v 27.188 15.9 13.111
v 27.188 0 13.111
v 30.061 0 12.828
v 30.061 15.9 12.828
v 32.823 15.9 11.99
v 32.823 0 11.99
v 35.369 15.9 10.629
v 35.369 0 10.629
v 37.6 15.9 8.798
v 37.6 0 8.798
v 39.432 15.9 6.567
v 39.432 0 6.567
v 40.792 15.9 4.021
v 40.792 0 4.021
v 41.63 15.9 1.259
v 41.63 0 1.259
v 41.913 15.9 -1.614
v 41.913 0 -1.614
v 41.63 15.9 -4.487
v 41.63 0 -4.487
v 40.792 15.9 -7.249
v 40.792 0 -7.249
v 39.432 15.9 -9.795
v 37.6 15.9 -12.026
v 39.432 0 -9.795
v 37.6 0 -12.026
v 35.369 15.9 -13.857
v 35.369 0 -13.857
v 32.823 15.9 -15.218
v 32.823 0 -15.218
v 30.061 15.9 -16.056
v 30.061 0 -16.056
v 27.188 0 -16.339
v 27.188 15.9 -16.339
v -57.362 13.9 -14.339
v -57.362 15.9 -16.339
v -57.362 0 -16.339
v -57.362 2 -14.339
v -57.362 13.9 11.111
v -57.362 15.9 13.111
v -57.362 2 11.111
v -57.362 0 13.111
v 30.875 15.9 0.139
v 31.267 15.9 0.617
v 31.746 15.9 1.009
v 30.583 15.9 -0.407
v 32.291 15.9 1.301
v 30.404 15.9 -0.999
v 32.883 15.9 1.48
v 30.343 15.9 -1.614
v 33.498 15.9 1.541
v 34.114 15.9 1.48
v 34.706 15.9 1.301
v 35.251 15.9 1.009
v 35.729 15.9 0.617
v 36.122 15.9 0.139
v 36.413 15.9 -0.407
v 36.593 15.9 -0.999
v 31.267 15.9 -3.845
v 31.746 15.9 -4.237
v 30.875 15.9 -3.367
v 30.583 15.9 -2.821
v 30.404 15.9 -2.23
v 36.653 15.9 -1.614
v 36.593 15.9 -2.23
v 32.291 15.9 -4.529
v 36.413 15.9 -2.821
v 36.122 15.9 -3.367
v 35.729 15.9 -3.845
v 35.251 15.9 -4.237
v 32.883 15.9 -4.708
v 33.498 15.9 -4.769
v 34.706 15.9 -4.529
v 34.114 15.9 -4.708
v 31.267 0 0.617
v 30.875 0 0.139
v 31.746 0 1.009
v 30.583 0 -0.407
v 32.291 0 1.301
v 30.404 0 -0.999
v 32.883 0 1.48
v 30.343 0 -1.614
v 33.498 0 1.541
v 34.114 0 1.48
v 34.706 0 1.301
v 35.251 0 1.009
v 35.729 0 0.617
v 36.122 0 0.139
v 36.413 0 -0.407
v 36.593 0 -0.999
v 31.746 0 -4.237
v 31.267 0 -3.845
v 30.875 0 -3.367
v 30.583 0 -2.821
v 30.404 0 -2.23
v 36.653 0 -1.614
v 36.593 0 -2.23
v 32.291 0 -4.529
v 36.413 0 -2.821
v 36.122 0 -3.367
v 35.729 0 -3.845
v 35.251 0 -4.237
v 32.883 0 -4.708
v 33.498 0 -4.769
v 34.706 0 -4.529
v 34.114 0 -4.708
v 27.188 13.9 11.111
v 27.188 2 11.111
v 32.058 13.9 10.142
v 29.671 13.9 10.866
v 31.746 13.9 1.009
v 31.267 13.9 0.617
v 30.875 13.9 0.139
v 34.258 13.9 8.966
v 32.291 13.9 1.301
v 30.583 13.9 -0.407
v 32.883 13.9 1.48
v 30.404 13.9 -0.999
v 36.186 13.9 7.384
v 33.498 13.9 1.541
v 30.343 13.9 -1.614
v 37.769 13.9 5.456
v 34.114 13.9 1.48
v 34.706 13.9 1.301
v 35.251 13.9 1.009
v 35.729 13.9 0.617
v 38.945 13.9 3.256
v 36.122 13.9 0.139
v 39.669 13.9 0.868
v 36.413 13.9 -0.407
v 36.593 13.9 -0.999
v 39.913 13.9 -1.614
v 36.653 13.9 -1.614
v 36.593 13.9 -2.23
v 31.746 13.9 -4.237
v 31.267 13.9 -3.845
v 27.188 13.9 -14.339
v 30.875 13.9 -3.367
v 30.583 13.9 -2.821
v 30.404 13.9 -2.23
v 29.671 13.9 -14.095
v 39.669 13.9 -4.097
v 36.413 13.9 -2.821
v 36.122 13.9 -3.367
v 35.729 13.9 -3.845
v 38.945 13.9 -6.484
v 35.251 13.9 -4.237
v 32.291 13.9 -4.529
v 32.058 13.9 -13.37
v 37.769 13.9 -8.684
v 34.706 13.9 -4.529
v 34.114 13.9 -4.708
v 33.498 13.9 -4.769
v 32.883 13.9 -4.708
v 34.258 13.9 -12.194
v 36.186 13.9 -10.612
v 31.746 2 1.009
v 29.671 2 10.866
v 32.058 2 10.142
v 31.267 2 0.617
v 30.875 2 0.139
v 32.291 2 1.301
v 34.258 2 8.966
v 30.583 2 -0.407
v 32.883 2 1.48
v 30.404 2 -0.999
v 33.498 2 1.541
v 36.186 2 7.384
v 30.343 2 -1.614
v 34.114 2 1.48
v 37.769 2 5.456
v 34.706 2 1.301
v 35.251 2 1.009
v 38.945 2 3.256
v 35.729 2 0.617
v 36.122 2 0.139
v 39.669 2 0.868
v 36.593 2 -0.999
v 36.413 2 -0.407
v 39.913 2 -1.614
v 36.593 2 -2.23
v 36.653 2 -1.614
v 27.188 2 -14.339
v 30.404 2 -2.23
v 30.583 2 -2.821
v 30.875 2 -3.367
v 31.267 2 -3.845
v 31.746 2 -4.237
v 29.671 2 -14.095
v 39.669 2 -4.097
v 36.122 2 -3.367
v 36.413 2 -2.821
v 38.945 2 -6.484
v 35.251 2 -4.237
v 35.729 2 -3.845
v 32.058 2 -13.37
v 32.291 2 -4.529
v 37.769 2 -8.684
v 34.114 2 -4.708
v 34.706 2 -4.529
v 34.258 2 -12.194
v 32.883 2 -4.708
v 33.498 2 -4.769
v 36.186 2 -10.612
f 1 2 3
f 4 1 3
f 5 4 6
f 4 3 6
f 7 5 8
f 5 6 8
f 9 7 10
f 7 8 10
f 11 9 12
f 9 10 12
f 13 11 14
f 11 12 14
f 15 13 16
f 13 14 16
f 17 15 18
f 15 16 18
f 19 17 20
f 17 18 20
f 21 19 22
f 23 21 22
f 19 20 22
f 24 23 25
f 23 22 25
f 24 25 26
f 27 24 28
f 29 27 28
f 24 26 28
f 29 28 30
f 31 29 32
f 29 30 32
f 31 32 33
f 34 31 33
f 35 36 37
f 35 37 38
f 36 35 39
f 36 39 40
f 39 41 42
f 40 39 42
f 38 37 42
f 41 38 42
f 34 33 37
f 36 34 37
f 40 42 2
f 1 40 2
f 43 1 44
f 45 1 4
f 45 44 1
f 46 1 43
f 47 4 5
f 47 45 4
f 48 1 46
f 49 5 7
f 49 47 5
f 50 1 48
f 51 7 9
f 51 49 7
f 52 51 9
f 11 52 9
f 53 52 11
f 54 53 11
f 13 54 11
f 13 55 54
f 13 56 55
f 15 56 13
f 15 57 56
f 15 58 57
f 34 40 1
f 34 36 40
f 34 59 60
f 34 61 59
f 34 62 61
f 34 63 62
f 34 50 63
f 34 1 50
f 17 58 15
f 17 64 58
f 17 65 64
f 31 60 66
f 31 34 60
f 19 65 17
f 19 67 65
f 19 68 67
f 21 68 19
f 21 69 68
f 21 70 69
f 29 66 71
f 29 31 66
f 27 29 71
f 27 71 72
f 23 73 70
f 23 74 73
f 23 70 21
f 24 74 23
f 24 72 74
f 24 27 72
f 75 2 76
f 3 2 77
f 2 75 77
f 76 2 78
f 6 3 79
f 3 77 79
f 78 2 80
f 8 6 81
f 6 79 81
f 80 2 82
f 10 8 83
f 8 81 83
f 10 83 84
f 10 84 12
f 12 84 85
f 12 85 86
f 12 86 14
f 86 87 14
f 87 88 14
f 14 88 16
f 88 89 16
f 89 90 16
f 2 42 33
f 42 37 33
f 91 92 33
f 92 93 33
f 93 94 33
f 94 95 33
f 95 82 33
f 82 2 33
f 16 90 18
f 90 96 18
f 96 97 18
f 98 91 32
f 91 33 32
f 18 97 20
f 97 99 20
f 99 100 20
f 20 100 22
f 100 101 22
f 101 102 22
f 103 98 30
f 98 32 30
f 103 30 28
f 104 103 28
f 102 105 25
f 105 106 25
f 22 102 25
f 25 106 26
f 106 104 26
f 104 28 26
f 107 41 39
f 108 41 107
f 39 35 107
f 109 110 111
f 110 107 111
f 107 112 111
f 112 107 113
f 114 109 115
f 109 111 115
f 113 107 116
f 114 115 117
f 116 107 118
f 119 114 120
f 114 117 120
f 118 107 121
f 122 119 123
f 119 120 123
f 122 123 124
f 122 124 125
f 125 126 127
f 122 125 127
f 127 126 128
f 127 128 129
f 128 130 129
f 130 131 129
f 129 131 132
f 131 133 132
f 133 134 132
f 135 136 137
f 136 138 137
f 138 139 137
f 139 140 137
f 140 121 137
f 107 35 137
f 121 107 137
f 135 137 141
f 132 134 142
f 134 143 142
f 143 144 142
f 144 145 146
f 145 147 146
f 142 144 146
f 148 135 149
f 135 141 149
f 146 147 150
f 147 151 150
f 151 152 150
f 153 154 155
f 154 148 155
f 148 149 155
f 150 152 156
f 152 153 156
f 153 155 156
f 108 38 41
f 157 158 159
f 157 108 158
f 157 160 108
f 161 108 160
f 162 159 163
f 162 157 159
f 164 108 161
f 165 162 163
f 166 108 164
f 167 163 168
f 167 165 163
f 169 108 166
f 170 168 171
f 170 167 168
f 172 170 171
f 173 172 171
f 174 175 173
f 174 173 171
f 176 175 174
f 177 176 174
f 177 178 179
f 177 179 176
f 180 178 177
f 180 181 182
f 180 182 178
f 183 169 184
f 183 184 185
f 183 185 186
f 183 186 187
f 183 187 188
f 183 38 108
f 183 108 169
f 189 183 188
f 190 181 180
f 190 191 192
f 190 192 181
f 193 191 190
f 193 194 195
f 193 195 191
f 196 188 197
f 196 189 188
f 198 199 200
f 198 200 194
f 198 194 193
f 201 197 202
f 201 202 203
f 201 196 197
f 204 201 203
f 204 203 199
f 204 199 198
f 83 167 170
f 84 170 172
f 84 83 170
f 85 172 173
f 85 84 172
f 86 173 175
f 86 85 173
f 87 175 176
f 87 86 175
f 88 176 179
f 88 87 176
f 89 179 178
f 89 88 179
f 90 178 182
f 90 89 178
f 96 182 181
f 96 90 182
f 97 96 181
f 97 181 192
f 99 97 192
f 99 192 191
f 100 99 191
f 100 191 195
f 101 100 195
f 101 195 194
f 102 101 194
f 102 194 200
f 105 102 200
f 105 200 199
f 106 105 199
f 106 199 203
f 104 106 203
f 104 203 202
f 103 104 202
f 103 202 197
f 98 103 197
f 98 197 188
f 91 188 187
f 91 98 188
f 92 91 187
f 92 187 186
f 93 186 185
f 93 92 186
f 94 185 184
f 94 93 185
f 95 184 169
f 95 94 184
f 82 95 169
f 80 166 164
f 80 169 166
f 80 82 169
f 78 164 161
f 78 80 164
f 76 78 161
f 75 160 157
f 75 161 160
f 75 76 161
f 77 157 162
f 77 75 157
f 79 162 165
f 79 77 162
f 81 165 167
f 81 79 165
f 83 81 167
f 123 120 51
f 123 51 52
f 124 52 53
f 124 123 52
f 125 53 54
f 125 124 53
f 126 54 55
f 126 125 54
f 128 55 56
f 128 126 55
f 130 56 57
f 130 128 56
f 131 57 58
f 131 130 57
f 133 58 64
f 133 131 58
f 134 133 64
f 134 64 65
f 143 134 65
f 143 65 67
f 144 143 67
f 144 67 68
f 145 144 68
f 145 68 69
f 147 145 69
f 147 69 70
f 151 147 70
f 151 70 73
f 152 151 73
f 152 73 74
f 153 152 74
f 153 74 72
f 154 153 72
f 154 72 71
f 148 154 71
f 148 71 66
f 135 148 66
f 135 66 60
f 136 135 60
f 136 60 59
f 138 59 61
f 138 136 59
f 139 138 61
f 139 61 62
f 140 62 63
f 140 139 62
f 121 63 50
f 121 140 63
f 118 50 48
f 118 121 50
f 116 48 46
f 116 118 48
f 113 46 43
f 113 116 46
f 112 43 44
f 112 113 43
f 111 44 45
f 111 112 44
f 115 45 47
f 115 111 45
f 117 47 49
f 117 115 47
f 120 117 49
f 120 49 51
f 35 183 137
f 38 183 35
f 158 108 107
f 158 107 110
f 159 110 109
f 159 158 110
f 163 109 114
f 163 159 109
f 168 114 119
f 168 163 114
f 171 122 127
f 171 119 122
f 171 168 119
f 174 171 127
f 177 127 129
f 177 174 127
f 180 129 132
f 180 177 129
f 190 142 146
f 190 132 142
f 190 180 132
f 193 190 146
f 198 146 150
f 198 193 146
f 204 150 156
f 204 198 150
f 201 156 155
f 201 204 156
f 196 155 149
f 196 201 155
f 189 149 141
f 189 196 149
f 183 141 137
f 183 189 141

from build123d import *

# Parameters (mm, degrees)
SKETCH1_R                = 3.155
BOSS_EXTRUDE7_DEPTH      = 15.9
SHELL1_T                 = -2
CUT_EXTRUDE5_START       = 2
CUT_EXTRUDE5_OUTLINE_R   = 5.155
CUT_EXTRUDE5_OUTLINE_R_2 = 3.155
CUT_EXTRUDE5_DEPTH       = 11.9


# Read off the part's stored shape, not the designer's step: Cut-Extrude5
with BuildPart() as part:
    # Sketch1 → Boss-Extrude7 (new body)
    with BuildSketch(Plane(origin=(0, 0, 0), x_dir=(1, 0, 0), z_dir=(0, 1, 0))):
        with BuildLine():
            Line((-57.361665301, -13.110958237), (27.188334699, -13.110958237))
            ThreePointArc((27.188334699, -13.110958237), (41.913334699, 1.614041763), (27.188334699, 16.339041763))
            Line((27.188334699, 16.339041763), (-57.361665301, 16.339041763))
            Line((-57.361665301, 16.339041763), (-57.361665301, -13.110958237))
        make_face()
        with Locations(Location((33.498334699, 1.614041763, 0), (0, 0, 270))):
            Circle(SKETCH1_R, mode=Mode.SUBTRACT)
    extrude(amount=BOSS_EXTRUDE7_DEPTH)

    # Shell1
    shell1_openings = [part.faces().sort_by_distance(p)[0] for p in [
        (-57.361665301, 7.95, -1.614041763),
    ]]
    offset(amount=SHELL1_T, openings=shell1_openings, kind=Kind.INTERSECTION)

    # Cut-Extrude5 outline → Cut-Extrude5 (cut)
    with BuildSketch(Plane(origin=(0, 0, 0), x_dir=(1, 0, 0), z_dir=(0, 1, 0)).offset(CUT_EXTRUDE5_START)):
        with Locations((33.498334699, 1.614041763)):
            Circle(CUT_EXTRUDE5_OUTLINE_R)
        with Locations((33.498334699, 1.614041763)):
            Circle(CUT_EXTRUDE5_OUTLINE_R_2, mode=Mode.SUBTRACT)
    extrude(amount=CUT_EXTRUDE5_DEPTH, mode=Mode.SUBTRACT)


solid = part.part
